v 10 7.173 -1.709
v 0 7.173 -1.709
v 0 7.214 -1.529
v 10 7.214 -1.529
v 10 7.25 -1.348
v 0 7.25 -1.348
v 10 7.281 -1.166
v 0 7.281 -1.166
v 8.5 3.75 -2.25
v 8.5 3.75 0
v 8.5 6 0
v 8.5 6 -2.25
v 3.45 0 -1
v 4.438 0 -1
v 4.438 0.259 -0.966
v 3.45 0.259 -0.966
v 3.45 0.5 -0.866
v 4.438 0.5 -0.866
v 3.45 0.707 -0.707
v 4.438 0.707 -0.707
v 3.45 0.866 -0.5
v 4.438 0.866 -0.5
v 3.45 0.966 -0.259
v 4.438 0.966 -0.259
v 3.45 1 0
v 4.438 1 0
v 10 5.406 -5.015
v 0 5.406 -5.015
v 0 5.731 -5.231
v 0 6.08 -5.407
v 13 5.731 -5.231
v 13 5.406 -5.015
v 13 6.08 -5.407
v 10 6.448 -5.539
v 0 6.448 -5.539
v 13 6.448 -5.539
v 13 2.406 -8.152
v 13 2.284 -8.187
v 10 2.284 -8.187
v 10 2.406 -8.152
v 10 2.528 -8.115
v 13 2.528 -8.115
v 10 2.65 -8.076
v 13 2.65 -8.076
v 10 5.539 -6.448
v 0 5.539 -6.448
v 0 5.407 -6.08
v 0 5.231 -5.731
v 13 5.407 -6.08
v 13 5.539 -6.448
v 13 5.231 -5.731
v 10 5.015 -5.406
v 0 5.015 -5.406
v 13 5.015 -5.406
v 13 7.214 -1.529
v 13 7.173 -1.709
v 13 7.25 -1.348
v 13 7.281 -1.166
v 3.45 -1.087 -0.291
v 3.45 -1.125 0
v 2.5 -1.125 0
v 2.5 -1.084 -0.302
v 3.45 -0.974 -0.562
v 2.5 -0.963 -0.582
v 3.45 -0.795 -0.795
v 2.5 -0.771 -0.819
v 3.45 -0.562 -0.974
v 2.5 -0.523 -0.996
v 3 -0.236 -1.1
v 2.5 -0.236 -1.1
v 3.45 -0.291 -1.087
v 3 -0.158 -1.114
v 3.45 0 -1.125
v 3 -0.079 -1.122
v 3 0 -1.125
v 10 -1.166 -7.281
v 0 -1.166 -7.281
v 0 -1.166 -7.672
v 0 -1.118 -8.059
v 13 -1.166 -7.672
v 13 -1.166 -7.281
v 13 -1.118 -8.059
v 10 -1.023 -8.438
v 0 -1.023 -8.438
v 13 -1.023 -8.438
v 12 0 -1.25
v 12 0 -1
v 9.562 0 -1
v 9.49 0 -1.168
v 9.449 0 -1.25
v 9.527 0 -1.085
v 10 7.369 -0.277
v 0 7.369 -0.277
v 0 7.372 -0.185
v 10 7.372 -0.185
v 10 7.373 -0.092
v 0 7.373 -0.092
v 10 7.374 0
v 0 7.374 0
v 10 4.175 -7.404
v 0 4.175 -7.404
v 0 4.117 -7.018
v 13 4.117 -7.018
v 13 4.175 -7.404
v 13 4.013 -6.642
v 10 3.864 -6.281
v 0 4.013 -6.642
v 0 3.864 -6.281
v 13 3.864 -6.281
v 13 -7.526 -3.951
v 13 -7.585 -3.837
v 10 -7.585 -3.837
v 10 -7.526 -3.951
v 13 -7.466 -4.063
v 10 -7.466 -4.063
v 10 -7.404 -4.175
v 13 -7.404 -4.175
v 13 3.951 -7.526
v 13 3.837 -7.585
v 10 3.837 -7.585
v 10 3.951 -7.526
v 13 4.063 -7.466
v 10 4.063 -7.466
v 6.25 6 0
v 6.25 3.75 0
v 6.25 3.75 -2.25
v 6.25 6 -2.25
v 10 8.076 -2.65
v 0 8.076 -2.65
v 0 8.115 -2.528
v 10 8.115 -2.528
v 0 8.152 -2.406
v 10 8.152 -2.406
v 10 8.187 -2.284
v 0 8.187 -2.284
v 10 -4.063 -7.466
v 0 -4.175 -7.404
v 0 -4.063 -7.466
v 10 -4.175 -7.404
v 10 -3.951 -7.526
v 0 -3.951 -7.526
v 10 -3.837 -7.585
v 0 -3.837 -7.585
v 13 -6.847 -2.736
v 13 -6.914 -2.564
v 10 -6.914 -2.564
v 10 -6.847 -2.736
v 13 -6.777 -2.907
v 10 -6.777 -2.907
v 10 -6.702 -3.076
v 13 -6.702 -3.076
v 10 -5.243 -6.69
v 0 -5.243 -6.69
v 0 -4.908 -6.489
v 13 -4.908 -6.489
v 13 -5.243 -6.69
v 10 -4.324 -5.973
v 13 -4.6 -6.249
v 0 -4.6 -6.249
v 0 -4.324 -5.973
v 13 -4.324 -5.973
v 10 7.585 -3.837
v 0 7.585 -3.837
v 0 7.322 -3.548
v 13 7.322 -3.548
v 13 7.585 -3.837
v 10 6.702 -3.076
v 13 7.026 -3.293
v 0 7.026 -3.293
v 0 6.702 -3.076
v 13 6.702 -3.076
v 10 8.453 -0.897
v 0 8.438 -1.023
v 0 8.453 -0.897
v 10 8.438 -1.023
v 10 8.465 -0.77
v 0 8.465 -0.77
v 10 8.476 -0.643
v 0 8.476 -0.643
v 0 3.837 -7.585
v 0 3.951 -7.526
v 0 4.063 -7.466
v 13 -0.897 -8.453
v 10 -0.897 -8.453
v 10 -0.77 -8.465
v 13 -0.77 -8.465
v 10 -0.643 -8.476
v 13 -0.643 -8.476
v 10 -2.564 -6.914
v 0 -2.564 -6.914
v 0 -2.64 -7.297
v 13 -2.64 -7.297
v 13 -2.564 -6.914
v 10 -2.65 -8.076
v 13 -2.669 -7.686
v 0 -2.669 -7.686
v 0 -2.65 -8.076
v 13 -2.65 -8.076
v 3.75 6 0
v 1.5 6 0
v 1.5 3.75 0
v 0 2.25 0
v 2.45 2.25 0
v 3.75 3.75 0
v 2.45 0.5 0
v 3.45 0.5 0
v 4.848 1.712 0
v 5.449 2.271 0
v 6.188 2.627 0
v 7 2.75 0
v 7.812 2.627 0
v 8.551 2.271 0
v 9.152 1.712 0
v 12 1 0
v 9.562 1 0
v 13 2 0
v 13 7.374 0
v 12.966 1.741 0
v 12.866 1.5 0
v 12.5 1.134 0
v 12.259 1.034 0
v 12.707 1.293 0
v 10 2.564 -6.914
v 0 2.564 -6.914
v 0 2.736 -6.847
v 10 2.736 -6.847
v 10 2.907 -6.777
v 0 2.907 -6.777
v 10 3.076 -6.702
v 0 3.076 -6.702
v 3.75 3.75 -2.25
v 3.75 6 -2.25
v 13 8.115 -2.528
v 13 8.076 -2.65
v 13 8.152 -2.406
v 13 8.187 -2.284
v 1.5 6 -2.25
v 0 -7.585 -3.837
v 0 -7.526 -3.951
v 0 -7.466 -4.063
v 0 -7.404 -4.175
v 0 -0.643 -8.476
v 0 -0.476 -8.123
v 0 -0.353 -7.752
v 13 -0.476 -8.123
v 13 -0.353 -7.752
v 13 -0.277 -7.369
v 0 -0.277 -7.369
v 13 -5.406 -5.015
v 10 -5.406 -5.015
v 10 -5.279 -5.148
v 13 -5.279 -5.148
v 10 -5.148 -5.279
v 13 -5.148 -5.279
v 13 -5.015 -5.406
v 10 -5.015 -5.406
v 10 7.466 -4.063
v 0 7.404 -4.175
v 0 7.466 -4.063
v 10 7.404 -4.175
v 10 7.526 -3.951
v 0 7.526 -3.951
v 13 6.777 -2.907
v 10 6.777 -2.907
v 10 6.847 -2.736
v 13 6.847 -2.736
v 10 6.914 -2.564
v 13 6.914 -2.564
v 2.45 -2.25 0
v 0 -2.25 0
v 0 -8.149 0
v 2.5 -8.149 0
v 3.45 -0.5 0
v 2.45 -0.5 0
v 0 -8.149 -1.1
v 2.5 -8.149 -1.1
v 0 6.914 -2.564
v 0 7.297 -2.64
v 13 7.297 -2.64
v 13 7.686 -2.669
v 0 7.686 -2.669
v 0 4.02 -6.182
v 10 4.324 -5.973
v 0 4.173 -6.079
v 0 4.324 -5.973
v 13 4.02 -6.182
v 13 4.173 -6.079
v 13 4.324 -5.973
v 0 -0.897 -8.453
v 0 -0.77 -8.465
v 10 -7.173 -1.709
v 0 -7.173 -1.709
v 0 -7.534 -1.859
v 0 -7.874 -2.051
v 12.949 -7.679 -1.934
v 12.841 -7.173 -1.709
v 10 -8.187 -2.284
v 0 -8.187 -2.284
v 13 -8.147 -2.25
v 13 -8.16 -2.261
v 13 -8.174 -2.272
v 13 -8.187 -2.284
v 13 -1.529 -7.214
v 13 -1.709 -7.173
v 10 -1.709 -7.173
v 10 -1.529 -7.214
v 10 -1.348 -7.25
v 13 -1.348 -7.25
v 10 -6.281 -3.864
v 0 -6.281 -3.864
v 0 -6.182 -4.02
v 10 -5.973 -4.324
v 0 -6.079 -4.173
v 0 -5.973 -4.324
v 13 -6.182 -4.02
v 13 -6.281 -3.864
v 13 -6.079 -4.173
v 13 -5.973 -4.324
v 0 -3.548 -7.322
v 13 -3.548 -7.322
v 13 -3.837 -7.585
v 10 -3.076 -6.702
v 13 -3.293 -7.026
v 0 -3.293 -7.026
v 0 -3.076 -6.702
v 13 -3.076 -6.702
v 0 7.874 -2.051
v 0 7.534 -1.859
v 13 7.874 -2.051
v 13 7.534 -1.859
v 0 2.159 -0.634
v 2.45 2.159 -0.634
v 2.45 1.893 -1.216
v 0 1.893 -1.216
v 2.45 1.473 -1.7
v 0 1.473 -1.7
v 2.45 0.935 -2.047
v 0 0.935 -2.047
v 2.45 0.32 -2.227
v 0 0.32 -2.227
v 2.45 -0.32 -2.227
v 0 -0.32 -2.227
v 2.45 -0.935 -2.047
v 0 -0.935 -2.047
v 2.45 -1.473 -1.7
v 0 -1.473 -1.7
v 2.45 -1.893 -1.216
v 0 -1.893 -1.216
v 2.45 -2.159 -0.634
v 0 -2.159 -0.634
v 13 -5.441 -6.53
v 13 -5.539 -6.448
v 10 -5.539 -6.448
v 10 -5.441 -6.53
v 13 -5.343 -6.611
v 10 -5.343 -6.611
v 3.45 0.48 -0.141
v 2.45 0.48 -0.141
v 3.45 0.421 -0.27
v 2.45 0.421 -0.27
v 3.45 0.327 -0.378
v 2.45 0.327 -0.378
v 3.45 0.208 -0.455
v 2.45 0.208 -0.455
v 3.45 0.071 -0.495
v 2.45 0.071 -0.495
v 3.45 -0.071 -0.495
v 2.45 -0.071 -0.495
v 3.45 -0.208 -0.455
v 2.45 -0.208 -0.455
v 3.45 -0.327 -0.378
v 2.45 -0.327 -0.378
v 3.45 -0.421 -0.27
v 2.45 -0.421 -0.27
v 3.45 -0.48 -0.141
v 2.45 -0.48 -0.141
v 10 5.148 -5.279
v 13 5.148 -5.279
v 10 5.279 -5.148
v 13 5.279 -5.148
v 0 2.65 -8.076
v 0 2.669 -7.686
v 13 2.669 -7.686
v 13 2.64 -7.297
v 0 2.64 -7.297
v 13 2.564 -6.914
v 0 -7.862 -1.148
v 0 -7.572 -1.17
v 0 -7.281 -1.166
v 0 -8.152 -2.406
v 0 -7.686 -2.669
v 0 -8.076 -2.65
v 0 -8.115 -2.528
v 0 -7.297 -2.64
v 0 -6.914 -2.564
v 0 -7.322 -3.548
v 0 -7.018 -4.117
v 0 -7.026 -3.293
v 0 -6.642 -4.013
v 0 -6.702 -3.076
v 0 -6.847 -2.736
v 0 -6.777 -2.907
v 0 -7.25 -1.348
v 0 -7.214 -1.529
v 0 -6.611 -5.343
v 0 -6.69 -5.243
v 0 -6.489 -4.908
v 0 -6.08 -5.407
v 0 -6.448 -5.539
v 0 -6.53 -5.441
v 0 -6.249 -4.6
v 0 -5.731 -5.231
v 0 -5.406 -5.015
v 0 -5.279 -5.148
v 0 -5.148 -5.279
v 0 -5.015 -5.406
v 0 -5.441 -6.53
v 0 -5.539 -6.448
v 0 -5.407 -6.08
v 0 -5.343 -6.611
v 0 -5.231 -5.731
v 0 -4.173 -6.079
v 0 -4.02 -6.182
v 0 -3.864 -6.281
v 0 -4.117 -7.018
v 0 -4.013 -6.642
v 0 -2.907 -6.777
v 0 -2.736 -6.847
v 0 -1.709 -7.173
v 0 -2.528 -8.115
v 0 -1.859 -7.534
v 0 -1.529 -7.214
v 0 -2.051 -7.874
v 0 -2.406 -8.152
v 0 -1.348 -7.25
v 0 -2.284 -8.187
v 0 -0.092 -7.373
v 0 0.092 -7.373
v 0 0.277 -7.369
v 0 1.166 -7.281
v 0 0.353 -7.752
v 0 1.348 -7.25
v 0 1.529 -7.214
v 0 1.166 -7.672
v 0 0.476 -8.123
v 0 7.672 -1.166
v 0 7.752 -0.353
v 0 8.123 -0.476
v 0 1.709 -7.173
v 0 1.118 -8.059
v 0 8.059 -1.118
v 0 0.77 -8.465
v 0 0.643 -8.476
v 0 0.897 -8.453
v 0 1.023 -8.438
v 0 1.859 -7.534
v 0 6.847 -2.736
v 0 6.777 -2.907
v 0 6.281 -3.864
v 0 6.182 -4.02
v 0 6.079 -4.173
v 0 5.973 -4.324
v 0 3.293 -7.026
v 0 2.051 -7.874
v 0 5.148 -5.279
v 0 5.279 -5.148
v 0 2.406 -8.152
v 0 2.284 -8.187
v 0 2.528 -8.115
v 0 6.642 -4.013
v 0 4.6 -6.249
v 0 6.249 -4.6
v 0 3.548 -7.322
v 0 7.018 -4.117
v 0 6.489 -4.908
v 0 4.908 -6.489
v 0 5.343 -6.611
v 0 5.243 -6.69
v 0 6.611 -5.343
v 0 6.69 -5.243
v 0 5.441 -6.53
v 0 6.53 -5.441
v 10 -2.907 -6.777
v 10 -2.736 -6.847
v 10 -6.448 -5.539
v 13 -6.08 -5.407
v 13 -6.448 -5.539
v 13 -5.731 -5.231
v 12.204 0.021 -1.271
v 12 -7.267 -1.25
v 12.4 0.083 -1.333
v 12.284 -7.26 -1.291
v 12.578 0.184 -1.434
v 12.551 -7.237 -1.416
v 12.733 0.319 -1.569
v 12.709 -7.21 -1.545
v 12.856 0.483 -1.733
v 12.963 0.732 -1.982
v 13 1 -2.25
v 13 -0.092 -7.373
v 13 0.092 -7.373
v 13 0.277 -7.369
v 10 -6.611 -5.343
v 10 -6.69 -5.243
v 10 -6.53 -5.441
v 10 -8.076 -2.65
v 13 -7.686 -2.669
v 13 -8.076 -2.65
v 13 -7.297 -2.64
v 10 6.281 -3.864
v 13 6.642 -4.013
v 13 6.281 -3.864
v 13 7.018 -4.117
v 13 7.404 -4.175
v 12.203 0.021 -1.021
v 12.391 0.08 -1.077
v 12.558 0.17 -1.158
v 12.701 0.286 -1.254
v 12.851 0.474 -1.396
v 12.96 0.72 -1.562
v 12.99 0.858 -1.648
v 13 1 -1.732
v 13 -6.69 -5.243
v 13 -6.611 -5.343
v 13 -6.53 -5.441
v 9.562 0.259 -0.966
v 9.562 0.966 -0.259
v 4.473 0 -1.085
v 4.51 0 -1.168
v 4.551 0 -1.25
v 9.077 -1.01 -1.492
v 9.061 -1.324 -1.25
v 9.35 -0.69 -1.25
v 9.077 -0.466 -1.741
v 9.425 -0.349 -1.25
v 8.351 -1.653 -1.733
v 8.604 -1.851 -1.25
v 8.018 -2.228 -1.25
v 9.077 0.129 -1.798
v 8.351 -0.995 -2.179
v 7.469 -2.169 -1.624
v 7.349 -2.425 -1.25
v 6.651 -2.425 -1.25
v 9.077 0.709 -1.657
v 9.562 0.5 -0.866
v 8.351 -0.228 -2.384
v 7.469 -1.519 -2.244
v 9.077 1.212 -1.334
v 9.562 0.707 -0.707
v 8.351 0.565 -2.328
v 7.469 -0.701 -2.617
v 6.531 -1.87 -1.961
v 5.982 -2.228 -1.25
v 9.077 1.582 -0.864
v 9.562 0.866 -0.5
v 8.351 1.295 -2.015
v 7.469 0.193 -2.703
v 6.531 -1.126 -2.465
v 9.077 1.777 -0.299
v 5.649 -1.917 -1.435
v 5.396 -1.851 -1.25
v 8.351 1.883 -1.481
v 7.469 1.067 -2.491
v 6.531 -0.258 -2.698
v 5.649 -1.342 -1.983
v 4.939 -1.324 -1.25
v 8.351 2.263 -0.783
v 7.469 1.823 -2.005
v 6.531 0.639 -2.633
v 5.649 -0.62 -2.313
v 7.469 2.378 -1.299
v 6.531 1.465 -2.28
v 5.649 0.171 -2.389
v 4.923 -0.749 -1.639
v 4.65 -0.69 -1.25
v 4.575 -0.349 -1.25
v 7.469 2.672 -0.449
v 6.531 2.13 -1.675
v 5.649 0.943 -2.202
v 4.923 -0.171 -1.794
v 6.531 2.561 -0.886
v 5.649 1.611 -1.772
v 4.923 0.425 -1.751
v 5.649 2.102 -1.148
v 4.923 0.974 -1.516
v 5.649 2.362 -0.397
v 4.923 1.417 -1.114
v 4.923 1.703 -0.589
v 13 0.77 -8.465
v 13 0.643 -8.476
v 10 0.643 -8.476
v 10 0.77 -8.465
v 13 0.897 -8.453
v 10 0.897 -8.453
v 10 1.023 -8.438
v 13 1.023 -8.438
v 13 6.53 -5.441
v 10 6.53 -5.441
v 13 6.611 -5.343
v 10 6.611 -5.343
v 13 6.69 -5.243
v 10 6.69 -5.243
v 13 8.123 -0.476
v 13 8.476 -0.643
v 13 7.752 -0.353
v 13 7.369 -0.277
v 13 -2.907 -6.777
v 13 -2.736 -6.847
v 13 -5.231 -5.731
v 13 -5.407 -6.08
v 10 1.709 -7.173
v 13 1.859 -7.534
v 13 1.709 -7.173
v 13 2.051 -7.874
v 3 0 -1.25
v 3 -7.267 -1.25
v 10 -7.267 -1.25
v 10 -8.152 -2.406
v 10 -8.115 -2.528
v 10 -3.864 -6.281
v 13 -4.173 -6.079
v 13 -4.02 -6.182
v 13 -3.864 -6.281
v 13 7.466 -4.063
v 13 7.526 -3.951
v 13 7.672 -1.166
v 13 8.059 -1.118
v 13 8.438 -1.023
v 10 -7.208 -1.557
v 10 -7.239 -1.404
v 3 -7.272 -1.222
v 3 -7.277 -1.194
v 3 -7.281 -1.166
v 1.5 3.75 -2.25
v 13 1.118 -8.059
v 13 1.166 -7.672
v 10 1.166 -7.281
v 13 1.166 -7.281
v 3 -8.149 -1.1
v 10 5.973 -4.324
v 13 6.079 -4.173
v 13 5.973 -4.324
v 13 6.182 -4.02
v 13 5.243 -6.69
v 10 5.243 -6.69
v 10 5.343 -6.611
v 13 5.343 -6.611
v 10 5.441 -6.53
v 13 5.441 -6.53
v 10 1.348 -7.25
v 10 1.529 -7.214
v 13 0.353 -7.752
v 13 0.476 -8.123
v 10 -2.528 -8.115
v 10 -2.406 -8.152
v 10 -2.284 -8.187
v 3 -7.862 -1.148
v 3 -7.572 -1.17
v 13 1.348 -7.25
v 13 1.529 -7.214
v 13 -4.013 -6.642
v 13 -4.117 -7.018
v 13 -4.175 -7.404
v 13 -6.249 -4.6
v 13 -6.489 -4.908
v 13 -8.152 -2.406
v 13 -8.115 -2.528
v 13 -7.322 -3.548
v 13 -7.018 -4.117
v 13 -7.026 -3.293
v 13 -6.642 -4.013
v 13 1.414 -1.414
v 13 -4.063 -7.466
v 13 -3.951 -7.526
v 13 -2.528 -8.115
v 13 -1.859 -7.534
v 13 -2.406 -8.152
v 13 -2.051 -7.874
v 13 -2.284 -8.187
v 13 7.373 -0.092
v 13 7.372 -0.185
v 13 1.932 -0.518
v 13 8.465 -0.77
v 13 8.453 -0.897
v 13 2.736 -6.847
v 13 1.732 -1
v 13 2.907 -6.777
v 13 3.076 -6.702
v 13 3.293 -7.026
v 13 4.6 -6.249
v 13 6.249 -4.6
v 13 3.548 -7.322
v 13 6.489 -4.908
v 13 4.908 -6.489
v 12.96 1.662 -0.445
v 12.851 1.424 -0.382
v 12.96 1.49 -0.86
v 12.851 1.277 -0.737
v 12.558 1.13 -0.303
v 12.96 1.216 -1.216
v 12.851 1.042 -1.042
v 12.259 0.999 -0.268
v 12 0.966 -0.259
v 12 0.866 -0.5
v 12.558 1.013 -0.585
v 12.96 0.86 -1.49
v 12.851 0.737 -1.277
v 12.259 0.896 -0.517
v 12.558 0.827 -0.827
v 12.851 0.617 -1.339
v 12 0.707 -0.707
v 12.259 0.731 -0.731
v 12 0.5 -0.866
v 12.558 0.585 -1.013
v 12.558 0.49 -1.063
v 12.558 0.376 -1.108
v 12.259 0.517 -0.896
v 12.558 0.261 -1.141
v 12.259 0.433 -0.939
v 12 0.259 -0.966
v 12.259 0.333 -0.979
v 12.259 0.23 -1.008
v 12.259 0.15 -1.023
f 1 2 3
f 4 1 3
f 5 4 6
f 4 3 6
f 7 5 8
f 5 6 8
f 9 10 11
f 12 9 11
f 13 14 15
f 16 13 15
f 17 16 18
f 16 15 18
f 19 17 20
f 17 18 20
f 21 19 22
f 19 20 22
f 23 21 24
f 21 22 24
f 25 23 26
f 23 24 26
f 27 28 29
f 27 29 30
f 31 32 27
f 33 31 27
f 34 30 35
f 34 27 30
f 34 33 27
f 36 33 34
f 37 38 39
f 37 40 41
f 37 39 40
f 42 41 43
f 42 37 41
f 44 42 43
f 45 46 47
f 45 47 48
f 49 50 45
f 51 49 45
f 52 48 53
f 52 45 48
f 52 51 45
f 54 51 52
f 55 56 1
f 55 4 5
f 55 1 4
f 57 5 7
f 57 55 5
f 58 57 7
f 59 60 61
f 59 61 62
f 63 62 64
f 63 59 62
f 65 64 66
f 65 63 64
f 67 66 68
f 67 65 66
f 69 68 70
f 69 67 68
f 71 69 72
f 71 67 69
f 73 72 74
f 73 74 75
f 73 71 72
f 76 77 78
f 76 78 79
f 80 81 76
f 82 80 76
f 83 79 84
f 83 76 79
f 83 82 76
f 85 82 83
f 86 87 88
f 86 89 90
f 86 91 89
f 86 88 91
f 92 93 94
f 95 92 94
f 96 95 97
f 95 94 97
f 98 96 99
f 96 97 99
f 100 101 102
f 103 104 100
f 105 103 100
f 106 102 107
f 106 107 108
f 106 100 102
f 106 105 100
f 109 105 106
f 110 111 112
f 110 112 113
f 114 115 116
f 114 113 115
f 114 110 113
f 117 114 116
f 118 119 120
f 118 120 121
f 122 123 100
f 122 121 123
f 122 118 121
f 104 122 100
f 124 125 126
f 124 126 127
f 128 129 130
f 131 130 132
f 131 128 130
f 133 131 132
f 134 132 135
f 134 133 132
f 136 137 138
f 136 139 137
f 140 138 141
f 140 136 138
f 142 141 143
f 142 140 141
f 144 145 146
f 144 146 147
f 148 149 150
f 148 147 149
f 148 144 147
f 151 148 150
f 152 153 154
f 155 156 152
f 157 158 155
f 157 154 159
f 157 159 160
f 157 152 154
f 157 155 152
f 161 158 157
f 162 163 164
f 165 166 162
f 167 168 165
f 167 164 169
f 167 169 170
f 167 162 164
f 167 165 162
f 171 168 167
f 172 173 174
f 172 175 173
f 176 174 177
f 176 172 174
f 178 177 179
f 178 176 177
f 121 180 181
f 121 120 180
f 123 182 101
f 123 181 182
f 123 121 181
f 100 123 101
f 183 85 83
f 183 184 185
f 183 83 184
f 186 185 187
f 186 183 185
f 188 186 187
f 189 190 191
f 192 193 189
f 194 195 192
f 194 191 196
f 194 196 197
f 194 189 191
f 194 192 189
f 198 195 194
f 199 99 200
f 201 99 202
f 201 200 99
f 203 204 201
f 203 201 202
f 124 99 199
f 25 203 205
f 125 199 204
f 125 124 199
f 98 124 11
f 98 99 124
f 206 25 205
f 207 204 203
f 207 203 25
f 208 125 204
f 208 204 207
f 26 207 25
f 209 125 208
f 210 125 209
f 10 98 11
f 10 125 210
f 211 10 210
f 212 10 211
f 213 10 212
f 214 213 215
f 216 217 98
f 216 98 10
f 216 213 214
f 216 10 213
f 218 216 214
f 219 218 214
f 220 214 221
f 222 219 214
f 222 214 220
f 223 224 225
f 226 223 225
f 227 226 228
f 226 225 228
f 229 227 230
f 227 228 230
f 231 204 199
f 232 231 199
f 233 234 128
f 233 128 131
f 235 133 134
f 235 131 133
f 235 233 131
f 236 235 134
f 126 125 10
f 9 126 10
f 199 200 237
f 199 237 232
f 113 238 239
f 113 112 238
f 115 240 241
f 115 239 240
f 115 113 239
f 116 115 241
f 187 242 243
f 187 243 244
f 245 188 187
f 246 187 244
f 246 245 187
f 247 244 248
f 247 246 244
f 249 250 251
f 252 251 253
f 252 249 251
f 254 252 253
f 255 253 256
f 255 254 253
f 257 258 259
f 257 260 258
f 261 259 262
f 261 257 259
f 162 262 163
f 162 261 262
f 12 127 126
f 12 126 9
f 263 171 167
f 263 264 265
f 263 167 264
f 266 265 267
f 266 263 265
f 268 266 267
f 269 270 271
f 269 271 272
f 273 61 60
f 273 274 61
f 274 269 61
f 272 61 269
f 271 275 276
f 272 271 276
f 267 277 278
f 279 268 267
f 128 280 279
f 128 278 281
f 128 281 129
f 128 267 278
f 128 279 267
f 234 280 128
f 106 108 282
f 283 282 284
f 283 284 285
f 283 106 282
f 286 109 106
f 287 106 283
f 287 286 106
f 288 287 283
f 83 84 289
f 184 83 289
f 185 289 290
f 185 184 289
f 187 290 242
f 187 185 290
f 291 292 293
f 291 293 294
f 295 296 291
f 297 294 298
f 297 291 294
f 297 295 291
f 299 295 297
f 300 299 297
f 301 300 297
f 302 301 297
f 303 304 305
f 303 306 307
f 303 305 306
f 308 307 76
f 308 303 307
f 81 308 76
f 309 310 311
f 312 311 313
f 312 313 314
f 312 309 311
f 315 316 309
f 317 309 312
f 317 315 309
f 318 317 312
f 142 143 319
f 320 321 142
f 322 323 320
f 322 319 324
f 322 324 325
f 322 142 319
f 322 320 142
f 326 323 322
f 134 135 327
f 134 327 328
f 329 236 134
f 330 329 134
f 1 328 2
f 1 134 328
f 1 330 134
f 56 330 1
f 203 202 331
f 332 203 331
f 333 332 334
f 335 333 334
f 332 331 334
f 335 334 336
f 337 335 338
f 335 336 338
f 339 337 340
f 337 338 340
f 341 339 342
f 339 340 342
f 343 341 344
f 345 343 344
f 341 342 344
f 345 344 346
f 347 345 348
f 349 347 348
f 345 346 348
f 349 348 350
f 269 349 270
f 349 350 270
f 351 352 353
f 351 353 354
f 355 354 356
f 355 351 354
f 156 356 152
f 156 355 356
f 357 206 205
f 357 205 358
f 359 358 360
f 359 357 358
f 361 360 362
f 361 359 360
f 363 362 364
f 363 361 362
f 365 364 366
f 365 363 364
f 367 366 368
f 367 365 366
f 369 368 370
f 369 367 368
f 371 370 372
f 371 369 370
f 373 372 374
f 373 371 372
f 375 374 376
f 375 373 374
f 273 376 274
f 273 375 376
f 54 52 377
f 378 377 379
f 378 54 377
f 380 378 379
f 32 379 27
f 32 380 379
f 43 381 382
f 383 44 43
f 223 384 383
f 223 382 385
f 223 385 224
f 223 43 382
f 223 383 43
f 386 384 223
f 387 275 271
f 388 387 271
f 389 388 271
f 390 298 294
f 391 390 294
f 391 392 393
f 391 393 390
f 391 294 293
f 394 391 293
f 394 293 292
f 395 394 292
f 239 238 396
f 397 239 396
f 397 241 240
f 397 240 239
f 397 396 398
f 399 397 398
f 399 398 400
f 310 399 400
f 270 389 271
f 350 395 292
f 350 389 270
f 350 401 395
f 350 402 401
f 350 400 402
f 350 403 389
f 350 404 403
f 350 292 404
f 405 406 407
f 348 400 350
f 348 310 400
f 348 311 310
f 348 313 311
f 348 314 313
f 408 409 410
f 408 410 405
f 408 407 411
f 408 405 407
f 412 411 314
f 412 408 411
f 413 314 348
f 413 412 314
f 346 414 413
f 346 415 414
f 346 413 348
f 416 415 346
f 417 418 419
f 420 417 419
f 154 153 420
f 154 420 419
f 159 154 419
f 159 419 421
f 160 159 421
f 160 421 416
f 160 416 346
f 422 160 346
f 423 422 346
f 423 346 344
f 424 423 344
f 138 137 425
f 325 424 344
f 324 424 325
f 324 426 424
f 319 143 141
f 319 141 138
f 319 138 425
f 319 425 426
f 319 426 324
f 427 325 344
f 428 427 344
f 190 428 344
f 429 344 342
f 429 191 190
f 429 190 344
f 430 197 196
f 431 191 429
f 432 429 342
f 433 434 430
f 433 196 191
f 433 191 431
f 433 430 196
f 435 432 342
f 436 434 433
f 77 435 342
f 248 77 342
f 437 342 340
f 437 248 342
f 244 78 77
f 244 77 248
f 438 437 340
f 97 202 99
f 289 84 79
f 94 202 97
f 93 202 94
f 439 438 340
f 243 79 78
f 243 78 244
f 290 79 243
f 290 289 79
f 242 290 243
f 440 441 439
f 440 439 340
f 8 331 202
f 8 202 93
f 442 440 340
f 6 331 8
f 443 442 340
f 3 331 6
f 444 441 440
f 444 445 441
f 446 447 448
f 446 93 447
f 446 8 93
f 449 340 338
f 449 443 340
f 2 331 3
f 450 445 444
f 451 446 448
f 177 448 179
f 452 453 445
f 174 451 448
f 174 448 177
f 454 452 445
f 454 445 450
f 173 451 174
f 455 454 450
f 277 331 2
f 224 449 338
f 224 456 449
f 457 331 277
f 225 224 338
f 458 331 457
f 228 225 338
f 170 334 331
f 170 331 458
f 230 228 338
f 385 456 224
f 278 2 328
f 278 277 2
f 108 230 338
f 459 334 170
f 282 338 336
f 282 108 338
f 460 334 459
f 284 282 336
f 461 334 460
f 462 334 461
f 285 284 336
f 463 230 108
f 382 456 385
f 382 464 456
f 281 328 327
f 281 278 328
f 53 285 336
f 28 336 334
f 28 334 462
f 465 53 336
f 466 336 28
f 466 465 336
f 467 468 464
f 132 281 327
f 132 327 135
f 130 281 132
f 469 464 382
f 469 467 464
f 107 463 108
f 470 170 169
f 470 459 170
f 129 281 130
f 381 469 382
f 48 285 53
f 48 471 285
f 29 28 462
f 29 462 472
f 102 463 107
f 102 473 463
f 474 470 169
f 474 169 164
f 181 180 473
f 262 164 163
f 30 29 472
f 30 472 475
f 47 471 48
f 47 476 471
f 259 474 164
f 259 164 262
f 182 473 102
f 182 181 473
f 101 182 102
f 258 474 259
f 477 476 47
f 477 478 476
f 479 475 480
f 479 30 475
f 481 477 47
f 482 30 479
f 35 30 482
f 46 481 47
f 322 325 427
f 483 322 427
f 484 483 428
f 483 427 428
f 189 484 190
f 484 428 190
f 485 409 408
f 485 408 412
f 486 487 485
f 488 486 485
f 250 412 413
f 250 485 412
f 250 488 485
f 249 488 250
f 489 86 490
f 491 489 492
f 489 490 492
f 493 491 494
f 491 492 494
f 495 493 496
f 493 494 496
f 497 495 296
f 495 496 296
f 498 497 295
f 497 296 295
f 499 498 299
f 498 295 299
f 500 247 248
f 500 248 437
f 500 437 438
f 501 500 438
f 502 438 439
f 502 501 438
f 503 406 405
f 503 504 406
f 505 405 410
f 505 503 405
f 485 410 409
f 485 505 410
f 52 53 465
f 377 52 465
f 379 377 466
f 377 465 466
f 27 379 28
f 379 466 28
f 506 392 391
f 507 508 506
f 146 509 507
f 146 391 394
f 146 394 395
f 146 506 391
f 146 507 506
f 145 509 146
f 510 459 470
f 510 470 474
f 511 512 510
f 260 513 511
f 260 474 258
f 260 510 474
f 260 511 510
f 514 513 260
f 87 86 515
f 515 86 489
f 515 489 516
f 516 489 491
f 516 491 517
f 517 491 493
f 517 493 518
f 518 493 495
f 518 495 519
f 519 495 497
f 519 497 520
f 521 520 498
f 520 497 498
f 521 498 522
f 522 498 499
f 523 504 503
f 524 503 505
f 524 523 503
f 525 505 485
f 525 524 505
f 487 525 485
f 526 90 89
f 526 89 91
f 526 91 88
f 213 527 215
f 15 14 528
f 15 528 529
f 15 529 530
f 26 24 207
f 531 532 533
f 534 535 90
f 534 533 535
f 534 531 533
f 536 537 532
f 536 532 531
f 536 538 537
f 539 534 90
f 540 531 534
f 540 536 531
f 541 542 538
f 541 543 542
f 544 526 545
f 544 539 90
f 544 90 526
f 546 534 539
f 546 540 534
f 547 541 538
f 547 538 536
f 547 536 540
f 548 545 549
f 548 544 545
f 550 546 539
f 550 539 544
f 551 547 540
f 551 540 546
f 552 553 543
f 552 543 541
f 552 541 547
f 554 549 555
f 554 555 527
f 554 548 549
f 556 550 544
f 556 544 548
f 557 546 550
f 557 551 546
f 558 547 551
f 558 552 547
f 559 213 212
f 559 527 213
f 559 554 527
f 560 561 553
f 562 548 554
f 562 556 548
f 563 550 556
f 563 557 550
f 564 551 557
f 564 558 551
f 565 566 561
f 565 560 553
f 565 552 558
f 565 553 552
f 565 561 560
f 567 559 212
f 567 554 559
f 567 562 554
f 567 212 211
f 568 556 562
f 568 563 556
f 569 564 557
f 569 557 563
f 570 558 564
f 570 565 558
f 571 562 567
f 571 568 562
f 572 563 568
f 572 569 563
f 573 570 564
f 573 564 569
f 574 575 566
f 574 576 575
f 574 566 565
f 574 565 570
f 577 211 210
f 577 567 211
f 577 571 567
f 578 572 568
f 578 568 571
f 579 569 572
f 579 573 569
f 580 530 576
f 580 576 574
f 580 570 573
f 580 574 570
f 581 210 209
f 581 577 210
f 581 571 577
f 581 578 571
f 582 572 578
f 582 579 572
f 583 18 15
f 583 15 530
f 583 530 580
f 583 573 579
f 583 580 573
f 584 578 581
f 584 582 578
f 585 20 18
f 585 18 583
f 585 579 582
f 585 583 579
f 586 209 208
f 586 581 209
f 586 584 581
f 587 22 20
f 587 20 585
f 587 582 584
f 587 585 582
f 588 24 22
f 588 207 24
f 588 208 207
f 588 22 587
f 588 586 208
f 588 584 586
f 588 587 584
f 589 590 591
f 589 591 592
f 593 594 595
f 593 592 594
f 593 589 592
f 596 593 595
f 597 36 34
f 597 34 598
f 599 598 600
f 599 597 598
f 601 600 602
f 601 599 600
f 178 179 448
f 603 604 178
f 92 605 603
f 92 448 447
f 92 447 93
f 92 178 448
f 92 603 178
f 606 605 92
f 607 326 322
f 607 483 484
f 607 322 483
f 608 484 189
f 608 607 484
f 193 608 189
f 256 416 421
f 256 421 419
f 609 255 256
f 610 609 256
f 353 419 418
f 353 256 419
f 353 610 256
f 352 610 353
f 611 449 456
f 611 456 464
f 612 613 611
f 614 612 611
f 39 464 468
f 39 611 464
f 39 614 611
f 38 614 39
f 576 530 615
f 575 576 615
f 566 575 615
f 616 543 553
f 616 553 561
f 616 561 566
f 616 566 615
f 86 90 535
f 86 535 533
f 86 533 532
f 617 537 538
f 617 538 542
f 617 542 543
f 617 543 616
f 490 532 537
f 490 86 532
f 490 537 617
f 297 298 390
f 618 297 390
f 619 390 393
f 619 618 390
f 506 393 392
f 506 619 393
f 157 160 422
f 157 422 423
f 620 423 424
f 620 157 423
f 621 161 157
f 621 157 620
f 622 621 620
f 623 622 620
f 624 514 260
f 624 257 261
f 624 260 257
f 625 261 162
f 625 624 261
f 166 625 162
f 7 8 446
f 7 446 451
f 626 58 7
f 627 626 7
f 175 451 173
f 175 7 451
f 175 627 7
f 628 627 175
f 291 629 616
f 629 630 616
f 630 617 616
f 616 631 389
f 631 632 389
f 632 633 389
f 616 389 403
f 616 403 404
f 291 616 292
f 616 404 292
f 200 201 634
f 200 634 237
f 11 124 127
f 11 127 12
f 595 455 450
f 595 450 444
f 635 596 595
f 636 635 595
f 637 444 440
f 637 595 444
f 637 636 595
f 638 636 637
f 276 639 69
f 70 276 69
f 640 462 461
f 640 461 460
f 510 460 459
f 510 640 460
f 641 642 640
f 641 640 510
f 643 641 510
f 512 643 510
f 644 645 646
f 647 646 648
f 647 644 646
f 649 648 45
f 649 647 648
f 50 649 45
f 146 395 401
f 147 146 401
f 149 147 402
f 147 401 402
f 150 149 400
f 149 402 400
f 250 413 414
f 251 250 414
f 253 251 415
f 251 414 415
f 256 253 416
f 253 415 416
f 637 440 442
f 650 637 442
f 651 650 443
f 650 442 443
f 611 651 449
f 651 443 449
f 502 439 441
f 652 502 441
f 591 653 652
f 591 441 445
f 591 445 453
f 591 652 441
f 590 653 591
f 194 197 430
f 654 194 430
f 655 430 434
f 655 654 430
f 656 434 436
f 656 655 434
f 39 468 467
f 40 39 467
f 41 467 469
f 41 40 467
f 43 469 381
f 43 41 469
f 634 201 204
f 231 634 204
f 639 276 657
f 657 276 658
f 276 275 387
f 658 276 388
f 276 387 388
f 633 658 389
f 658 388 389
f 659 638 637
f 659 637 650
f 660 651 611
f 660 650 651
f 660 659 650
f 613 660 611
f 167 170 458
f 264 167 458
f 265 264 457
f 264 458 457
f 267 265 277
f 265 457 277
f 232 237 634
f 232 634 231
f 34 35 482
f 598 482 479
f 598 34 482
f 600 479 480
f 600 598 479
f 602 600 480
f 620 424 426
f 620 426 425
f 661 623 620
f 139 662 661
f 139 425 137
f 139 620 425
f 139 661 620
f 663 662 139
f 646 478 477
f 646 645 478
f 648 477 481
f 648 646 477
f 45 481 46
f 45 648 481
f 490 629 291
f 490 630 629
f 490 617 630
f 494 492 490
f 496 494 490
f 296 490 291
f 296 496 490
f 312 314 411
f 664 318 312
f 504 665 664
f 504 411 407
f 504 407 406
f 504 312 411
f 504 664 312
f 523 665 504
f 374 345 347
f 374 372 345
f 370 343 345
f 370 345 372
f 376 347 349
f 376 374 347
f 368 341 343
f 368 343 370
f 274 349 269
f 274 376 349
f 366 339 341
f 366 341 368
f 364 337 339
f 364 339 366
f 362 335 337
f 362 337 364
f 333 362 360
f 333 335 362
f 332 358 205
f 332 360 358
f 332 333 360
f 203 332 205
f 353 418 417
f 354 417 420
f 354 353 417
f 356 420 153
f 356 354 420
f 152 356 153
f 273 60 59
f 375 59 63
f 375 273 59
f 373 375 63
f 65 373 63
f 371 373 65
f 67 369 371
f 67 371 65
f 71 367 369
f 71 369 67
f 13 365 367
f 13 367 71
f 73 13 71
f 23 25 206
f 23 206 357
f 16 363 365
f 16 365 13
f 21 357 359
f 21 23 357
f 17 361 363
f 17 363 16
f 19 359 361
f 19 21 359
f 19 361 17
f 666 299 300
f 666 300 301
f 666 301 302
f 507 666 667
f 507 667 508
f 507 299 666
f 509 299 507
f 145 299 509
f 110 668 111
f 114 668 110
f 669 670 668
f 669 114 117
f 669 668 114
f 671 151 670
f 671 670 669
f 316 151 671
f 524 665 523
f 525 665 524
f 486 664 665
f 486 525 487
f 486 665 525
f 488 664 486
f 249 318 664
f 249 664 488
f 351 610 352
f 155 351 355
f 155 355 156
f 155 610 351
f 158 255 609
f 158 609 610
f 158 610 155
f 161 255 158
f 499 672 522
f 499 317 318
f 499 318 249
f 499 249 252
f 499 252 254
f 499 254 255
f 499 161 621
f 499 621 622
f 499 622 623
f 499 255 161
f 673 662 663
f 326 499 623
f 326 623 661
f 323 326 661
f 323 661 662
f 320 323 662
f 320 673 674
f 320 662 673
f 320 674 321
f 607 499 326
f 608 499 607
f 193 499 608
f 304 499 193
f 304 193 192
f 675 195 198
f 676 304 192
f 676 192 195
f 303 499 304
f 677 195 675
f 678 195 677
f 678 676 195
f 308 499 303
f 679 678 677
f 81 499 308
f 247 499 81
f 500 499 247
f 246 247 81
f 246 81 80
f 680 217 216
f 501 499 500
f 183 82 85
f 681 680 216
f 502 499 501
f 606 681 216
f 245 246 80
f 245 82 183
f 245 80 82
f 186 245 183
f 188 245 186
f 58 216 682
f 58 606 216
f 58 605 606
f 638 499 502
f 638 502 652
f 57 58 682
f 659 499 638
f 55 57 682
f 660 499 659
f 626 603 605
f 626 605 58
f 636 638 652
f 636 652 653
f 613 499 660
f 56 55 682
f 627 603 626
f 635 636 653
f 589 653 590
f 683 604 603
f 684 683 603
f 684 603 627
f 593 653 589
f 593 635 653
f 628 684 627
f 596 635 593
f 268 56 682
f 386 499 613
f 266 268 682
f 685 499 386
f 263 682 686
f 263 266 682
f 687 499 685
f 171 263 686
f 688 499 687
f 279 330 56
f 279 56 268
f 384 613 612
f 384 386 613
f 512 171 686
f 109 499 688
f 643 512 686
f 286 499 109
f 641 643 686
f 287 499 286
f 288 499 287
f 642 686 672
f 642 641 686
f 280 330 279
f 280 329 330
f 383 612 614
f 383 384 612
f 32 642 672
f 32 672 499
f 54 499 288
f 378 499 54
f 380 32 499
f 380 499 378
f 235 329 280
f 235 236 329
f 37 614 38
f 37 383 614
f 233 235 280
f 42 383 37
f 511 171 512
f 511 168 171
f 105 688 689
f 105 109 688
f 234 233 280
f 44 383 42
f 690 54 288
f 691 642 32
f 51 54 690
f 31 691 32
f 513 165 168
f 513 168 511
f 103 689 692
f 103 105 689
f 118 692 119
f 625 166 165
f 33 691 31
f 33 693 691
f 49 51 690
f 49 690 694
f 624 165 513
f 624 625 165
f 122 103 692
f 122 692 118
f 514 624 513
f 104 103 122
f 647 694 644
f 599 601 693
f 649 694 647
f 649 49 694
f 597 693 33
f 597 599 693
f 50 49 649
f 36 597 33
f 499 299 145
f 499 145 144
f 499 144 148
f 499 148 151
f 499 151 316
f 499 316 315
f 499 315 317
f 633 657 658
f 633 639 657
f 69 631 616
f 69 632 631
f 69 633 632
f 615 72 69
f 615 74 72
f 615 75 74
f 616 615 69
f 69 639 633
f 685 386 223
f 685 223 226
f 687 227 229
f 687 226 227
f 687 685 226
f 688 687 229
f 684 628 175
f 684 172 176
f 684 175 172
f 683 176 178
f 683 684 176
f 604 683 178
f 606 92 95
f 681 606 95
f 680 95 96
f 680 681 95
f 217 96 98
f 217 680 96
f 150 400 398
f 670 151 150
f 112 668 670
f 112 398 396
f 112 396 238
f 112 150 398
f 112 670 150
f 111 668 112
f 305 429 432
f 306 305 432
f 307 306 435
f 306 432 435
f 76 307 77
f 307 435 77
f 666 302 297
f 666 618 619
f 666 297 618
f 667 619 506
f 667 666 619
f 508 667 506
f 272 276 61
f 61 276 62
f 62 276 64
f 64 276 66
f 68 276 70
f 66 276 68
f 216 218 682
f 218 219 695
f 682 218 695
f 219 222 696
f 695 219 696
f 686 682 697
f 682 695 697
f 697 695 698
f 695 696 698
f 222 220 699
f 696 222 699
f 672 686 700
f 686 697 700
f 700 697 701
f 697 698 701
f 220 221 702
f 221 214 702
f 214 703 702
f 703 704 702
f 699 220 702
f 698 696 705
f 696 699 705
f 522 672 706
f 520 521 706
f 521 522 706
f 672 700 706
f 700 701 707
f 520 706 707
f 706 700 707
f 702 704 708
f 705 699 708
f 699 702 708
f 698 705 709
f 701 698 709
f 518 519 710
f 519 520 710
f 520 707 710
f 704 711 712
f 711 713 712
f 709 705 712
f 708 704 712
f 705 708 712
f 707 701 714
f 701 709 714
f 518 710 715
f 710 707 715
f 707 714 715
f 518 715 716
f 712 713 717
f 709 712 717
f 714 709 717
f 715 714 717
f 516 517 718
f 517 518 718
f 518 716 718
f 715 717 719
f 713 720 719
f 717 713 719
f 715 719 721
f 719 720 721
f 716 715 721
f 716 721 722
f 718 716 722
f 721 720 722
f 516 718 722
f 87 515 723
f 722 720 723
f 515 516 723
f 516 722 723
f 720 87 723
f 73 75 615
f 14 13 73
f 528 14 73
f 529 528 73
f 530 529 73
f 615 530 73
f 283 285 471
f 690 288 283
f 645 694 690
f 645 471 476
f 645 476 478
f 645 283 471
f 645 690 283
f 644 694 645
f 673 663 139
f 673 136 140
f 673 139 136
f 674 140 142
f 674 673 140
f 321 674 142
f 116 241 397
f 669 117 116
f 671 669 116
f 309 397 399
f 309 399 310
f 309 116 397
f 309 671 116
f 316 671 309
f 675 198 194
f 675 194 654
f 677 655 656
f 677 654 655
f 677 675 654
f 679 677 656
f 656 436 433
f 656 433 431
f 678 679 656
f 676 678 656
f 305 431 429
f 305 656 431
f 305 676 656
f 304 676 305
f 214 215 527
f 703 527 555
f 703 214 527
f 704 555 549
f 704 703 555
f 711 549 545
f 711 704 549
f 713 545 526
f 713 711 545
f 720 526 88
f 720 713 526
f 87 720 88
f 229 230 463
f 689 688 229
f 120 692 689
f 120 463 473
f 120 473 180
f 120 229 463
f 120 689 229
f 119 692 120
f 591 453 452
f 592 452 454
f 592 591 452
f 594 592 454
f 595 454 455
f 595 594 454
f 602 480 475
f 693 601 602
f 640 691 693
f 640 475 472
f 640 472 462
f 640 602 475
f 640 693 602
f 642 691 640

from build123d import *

# Parameters (mm, degrees)
BASPROSKE_W         = 10
BASPROSKE_H         = 8.5
TOOTHCUT_DEPTH      = 16.636495771
TEETHCUTS_COUNT     = 32
TEETHCUTS_ANGLE     = 348.75
BORSKE_R            = 1
BORE_DEPTH          = 50.0000508
SKETCH1_W           = 2.2
SKETCH1_H           = 12
CUT_EXTRUDE1_DEPTH  = 16.610070769
SKETCH4_R           = 1.125
SKETCH4_R_2         = 0.5
BOSS_EXTRUDE1_DEPTH = 0.5
BOSS_EXTRUDE2_REACH = 18.234
SKETCH5_W           = 2.5
SKETCH5_H           = 8.148803967
SKETCH6_R           = 2.25
CUT_EXTRUDE4_DEPTH  = 2.45
SKETCH7_R           = 0.5
CUT_EXTRUDE5_DEPTH  = 2.4
SKETCH8_W           = 11.062945953
SKETCH8_H           = 17.798852561
CUT_EXTRUDE7_DEPTH  = 10
SKETCH9_W           = 2.25
SKETCH9_H           = 2.25
CUT_EXTRUDE8_DEPTH  = 2.25
SKETCH10_W          = 1.25
SKETCH10_H          = 9
CUT_EXTRUDE10_DEPTH = 7
BOSS_EXTRUDE3_REACH = 18.961
BOSS_EXTRUDE4_DEPTH = 1.25
BOSS_EXTRUDE5_START = -1
BOSS_EXTRUDE5_DEPTH = 1
FILLET1_R           = 1


with BuildPart() as part:
    # BasProSke → Base-Revolve (revolve)
    with BuildSketch(Plane(origin=(0, 0, 0), x_dir=(1, 0, 0), z_dir=(0, 1, 0)), mode=Mode.PRIVATE) as base_revolve_sk:
        with Locations((5, 4.25)):
            Rectangle(BASPROSKE_W, BASPROSKE_H)
    revolve(base_revolve_sk.sketch.rotate(Axis((-10, 0, 0), (1, 0, 0)), 180), axis=Axis((-10, 0, 0), (1, 0, 0)))

    # TooCutSke → ToothCut (cut, through all)
    with BuildSketch(Plane(origin=(0, 0, 0), x_dir=(0, 0, -1), z_dir=(1, 0, 0))):
        with BuildLine():
            ThreePointArc((0.277002447, 7.3687954), (0, 7.374), (-0.277002447, 7.3687954))
            ThreePointArc((-0.277002447, 7.3687954), (-0.41335061, 7.952280695), (-0.656086882, 8.500117362))
            ThreePointArc((-0.656086882, 8.500117362), (0, 8.5254), (0.656086882, 8.500117362))
            ThreePointArc((0.656086882, 8.500117362), (0.41335061, 7.952280695), (0.277002447, 7.3687954))
        make_face()
    toothcut = extrude(amount=TOOTHCUT_DEPTH, mode=Mode.SUBTRACT)

    # TeethCuts: ToothCut ×32 about axis
    teethcuts_axis = Axis((-10, 0, 0), (1, 0, 0))
    for i in range(1, TEETHCUTS_COUNT):
        add(toothcut.rotate(teethcuts_axis, i * TEETHCUTS_ANGLE / (TEETHCUTS_COUNT - 1)), mode=Mode.SUBTRACT)

    # BorSke → Bore (cut, symmetric)
    with BuildSketch(Plane(origin=(0, 0, 0), x_dir=(0, 0, -1), z_dir=(1, 0, 0))):
        with Locations(Location((0, 0, 0), (0, 0, 180))):
            Circle(BORSKE_R)
    extrude(amount=BORE_DEPTH, both=True, mode=Mode.SUBTRACT)

    # Sketch1 → Cut-Extrude1 (cut, through all)
    with BuildSketch(Plane(origin=(10, 0, 0), x_dir=(0, 0, -1), z_dir=(1, 0, 0))):
        with Locations((0, -6)):
            Rectangle(SKETCH1_W, SKETCH1_H)
    extrude(amount=-CUT_EXTRUDE1_DEPTH, mode=Mode.SUBTRACT)

    # Sketch2 → Cut-Revolve1 (revolve, cut)
    with BuildSketch(Plane.XY):
        with BuildLine():
            Line((4.25, 0), (9.75, 0))
            ThreePointArc((9.75, 0), (7, 2.75), (4.25, 0))
        make_face()
    revolve(axis=Axis((4.25, 0, 0), (1, 0, 0)), mode=Mode.SUBTRACT)

    # Sketch4 → Boss-Extrude1 (add)
    with BuildSketch(Plane.ZY.offset(-3)):
        Circle(SKETCH4_R)
        Circle(SKETCH4_R_2, mode=Mode.SUBTRACT)
    extrude(amount=BOSS_EXTRUDE1_DEPTH)

    # Sketch5 → Boss-Extrude2 (add, up to next)
    with BuildSketch(Plane.XY.offset(-1.1), mode=Mode.PRIVATE) as boss_extrude2_sk1:
        with Locations((1.25, -4.074401984)):
            Rectangle(SKETCH5_W, SKETCH5_H)
    boss_extrude2_tool1 = extrude(boss_extrude2_sk1.sketch, amount=BOSS_EXTRUDE2_REACH, mode=Mode.PRIVATE) - part.part
    add(boss_extrude2_tool1.solids().sort_by_distance((1.25, -4.074402, -1.1))[0])

    # Sketch6 → Cut-Extrude4 (cut)
    with BuildSketch(Plane.ZY):
        Circle(SKETCH6_R)
    extrude(amount=-CUT_EXTRUDE4_DEPTH, mode=Mode.SUBTRACT)

    # Sketch7 → Cut-Extrude5 (cut)
    with BuildSketch(Plane(origin=(2.5, 0, 0), x_dir=(0, 0, -1), z_dir=(1, 0, 0))):
        with Locations(Location((0, 0, 0), (0, 0, 180))):
            Circle(SKETCH7_R)
    extrude(amount=-CUT_EXTRUDE5_DEPTH, mode=Mode.SUBTRACT)

    # Sketch8 → Cut-Extrude7 (cut)
    with BuildSketch(Plane.XY):
        with Locations((5.022304327, 0.010278679)):
            Rectangle(SKETCH8_W, SKETCH8_H)
    extrude(amount=CUT_EXTRUDE7_DEPTH, mode=Mode.SUBTRACT)

    # Sketch9 → Cut-Extrude8 (cut)
    with BuildSketch(Plane.XY):
        with Locations((2.625, 4.875)):
            Rectangle(SKETCH9_W, SKETCH9_H)
        with Locations((7.375, 4.875)):
            Rectangle(SKETCH9_W, SKETCH9_H)
    extrude(amount=-CUT_EXTRUDE8_DEPTH, mode=Mode.SUBTRACT)

    # Sketch10 → Cut-Extrude10 (cut)
    with BuildSketch(Plane(origin=(10, 0, 0), x_dir=(0, 0, -1), z_dir=(1, 0, 0))):
        with Locations((0.625, -4.5)):
            Rectangle(SKETCH10_W, SKETCH10_H)
    extrude(amount=-CUT_EXTRUDE10_DEPTH, mode=Mode.SUBTRACT)

    # Sketch11 → Boss-Extrude3 (add, up to next)
    with BuildSketch(Plane(origin=(12, 0, 0), x_dir=(0, 0, -1), z_dir=(1, 0, 0)), mode=Mode.PRIVATE) as boss_extrude3_sk1:
        with BuildLine():
            Line((0, 1), (0, 7.374))
            ThreePointArc((0, 7.374), (0.138525669, 7.372698735), (0.277002447, 7.3687954))
            ThreePointArc((0.277002447, 7.3687954), (0.408940123, 7.939022225), (0.642530382, 8.475680191))
            ThreePointArc((0.642530382, 8.475680191), (0.833145693, 8.459070177), (1.023338837, 8.438173832))
            ThreePointArc((1.023338837, 8.438173832), (1.14774395, 7.866256399), (1.165900745, 7.281246559))
            ThreePointArc((1.165900745, 7.281246559), (1.438596035, 7.232310658), (1.70926059, 7.173165566))
            ThreePointArc((1.70926059, 7.173165566), (1.949908855, 7.706695879), (2.283707519, 8.187470914))
            ThreePointArc((2.283707519, 8.187470914), (2.467419757, 8.133992854), (2.649881718, 8.076393185))
            ThreePointArc((2.649881718, 8.076393185), (2.660320865, 7.491194752), (2.563999025, 6.913883496))
            ThreePointArc((2.563999025, 6.913883496), (2.82190763, 6.812687673), (3.075832807, 6.701875002))
            ThreePointArc((3.075832807, 6.701875002), (3.415943684, 7.178205532), (3.837123056, 7.584621721))
            ThreePointArc((3.837123056, 7.584621721), (4.006872263, 7.496330747), (4.174591131, 7.404241277))
            ThreePointArc((4.174591131, 7.404241277), (4.070663142, 6.828250691), (3.86356426, 6.280823768))
            ThreePointArc((3.86356426, 6.280823768), (4.096774898, 6.131256921), (4.324202495, 5.97303514))
            ThreePointArc((4.324202495, 5.97303514), (4.750705713, 6.373860772), (5.243080107, 6.690299769))
            ThreePointArc((5.243080107, 6.690299769), (5.392342915, 6.570588854), (5.538873348, 6.447548529))
            ThreePointArc((5.538873348, 6.447548529), (5.324572118, 5.902900785), (5.014654888, 5.406395505))
            ThreePointArc((5.014654888, 5.406395505), (5.214205404, 5.214205404), (5.406395505, 5.014654888))
            ThreePointArc((5.406395505, 5.014654888), (5.902900785, 5.324572118), (6.447548529, 5.538873348))
            ThreePointArc((6.447548529, 5.538873348), (6.570588854, 5.392342915), (6.690299769, 5.243080107))
            ThreePointArc((6.690299769, 5.243080107), (6.373860772, 4.750705713), (5.97303514, 4.324202495))
            ThreePointArc((5.97303514, 4.324202495), (6.131256921, 4.096774898), (6.280823768, 3.86356426))
            ThreePointArc((6.280823768, 3.86356426), (6.828250691, 4.070663142), (7.404241277, 4.174591131))
            ThreePointArc((7.404241277, 4.174591131), (7.496330747, 4.006872263), (7.584621721, 3.837123056))
            ThreePointArc((7.584621721, 3.837123056), (7.178205532, 3.415943684), (6.701875002, 3.075832807))
            ThreePointArc((6.701875002, 3.075832807), (6.812687673, 2.82190763), (6.913883496, 2.563999025))
            ThreePointArc((6.913883496, 2.563999025), (7.491194752, 2.660320865), (8.076393185, 2.649881718))
            ThreePointArc((8.076393185, 2.649881718), (8.133992854, 2.467419757), (8.187470914, 2.283707519))
            ThreePointArc((8.187470914, 2.283707519), (7.706695879, 1.949908855), (7.173165566, 1.70926059))
            ThreePointArc((7.173165566, 1.70926059), (7.232310658, 1.438596035), (7.281246559, 1.165900745))
            ThreePointArc((7.281246559, 1.165900745), (7.866256399, 1.14774395), (8.438173832, 1.023338837))
            ThreePointArc((8.438173832, 1.023338837), (8.459070177, 0.833145693), (8.475680191, 0.642530382))
            ThreePointArc((8.475680191, 0.642530382), (7.939022225, 0.408940123), (7.3687954, 0.277002447))
            ThreePointArc((7.3687954, 0.277002447), (7.374, 0), (7.3687954, -0.277002447))
            ThreePointArc((7.3687954, -0.277002447), (7.939022225, -0.408940123), (8.475680191, -0.642530382))
            ThreePointArc((8.475680191, -0.642530382), (8.459070177, -0.833145693), (8.438173832, -1.023338837))
            ThreePointArc((8.438173832, -1.023338837), (7.866256399, -1.14774395), (7.281246559, -1.165900745))
            ThreePointArc((7.281246559, -1.165900745), (7.232310658, -1.438596035), (7.173165566, -1.70926059))
            ThreePointArc((7.173165566, -1.70926059), (7.706695879, -1.949908855), (8.187470914, -2.283707519))
            ThreePointArc((8.187470914, -2.283707519), (8.133992854, -2.467419757), (8.076393185, -2.649881718))
            ThreePointArc((8.076393185, -2.649881718), (7.491194752, -2.660320865), (6.913883496, -2.563999025))
            ThreePointArc((6.913883496, -2.563999025), (6.812687673, -2.82190763), (6.701875002, -3.075832807))
            ThreePointArc((6.701875002, -3.075832807), (7.178205532, -3.415943684), (7.584621721, -3.837123056))
            ThreePointArc((7.584621721, -3.837123056), (7.496330747, -4.006872263), (7.404241277, -4.174591131))
            ThreePointArc((7.404241277, -4.174591131), (6.828250691, -4.070663142), (6.280823768, -3.86356426))
            ThreePointArc((6.280823768, -3.86356426), (6.131256921, -4.096774898), (5.97303514, -4.324202495))
            ThreePointArc((5.97303514, -4.324202495), (6.373860772, -4.750705713), (6.690299769, -5.243080107))
            ThreePointArc((6.690299769, -5.243080107), (6.570588854, -5.392342915), (6.447548529, -5.538873348))
            ThreePointArc((6.447548529, -5.538873348), (5.902900785, -5.324572118), (5.406395505, -5.014654888))
            ThreePointArc((5.406395505, -5.014654888), (5.214205404, -5.214205404), (5.014654888, -5.406395505))
            ThreePointArc((5.014654888, -5.406395505), (5.324572118, -5.902900785), (5.538873348, -6.447548529))
            ThreePointArc((5.538873348, -6.447548529), (5.392342915, -6.570588854), (5.243080107, -6.690299769))
            ThreePointArc((5.243080107, -6.690299769), (4.750705713, -6.373860772), (4.324202495, -5.97303514))
            ThreePointArc((4.324202495, -5.97303514), (4.096774898, -6.131256921), (3.86356426, -6.280823768))
            ThreePointArc((3.86356426, -6.280823768), (4.070663142, -6.828250691), (4.174591131, -7.404241277))
            ThreePointArc((4.174591131, -7.404241277), (4.006872263, -7.496330747), (3.837123056, -7.584621721))
            ThreePointArc((3.837123056, -7.584621721), (3.415943684, -7.178205532), (3.075832807, -6.701875002))
            ThreePointArc((3.075832807, -6.701875002), (2.82190763, -6.812687673), (2.563999025, -6.913883496))
            ThreePointArc((2.563999025, -6.913883496), (2.660320865, -7.491194752), (2.649881718, -8.076393185))
            ThreePointArc((2.649881718, -8.076393185), (2.467419757, -8.133992854), (2.283707519, -8.187470914))
            ThreePointArc((2.283707519, -8.187470914), (1.949908855, -7.706695879), (1.70926059, -7.173165566))
            ThreePointArc((1.70926059, -7.173165566), (1.480378414, -7.223874013), (1.25, -7.267281197))
            Line((1.25, -7.267281197), (1.25, 0))
            Line((1.25, 0), (1, 0))
            ThreePointArc((1, 0), (0.707106781, 0.707106781), (0, 1))
        make_face()
    boss_extrude3_tool1 = extrude(boss_extrude3_sk1.sketch, amount=-BOSS_EXTRUDE3_REACH, mode=Mode.PRIVATE) - part.part
    add(boss_extrude3_tool1.solids().sort_by_distance((12, 0.4527, -3.714882))[0])

    # Sketch14 → Boss-Extrude4 (add)
    with BuildSketch(Plane(origin=(13, 0, 0), x_dir=(0, 0, -1), z_dir=(1, 0, 0))):
        with BuildLine():
            Line((0, 7.374), (0, 1))
            ThreePointArc((0, 1), (0.707106781, 0.707106781), (1, 0))
            Line((1, 0), (1.25, 0))
            Line((1.25, 0), (1.25, -7.267281197))
            ThreePointArc((1.25, -7.267281197), (1.480378414, -7.223874013), (1.70926059, -7.173165566))
            ThreePointArc((1.70926059, -7.173165566), (1.949908855, -7.706695879), (2.283707519, -8.187470914))
            ThreePointArc((2.283707519, -8.187470914), (2.467419757, -8.133992854), (2.649881718, -8.076393185))
            ThreePointArc((2.649881718, -8.076393185), (2.660320865, -7.491194752), (2.563999025, -6.913883496))
            ThreePointArc((2.563999025, -6.913883496), (2.82190763, -6.812687673), (3.075832807, -6.701875002))
            ThreePointArc((3.075832807, -6.701875002), (3.415943684, -7.178205532), (3.837123056, -7.584621721))
            ThreePointArc((3.837123056, -7.584621721), (4.006872263, -7.496330747), (4.174591131, -7.404241277))
            ThreePointArc((4.174591131, -7.404241277), (4.070663142, -6.828250691), (3.86356426, -6.280823768))
            ThreePointArc((3.86356426, -6.280823768), (4.096774898, -6.131256921), (4.324202495, -5.97303514))
            ThreePointArc((4.324202495, -5.97303514), (4.750705713, -6.373860772), (5.243080107, -6.690299769))
            ThreePointArc((5.243080107, -6.690299769), (5.392342915, -6.570588854), (5.538873348, -6.447548529))
            ThreePointArc((5.538873348, -6.447548529), (5.324572118, -5.902900785), (5.014654888, -5.406395505))
            ThreePointArc((5.014654888, -5.406395505), (5.214205404, -5.214205404), (5.406395505, -5.014654888))
            ThreePointArc((5.406395505, -5.014654888), (5.902900785, -5.324572118), (6.447548529, -5.538873348))
            ThreePointArc((6.447548529, -5.538873348), (6.570588854, -5.392342915), (6.690299769, -5.243080107))
            ThreePointArc((6.690299769, -5.243080107), (6.373860772, -4.750705713), (5.97303514, -4.324202495))
            ThreePointArc((5.97303514, -4.324202495), (6.131256921, -4.096774898), (6.280823768, -3.86356426))
            ThreePointArc((6.280823768, -3.86356426), (6.828250691, -4.070663142), (7.404241277, -4.174591131))
            ThreePointArc((7.404241277, -4.174591131), (7.496330747, -4.006872263), (7.584621721, -3.837123056))
            ThreePointArc((7.584621721, -3.837123056), (7.178205532, -3.415943684), (6.701875002, -3.075832807))
            ThreePointArc((6.701875002, -3.075832807), (6.812687673, -2.82190763), (6.913883496, -2.563999025))
            ThreePointArc((6.913883496, -2.563999025), (7.491194752, -2.660320865), (8.076393185, -2.649881718))
            ThreePointArc((8.076393185, -2.649881718), (8.133992854, -2.467419757), (8.187470914, -2.283707519))
            ThreePointArc((8.187470914, -2.283707519), (7.706695879, -1.949908855), (7.173165566, -1.70926059))
            ThreePointArc((7.173165566, -1.70926059), (7.232310658, -1.438596035), (7.281246559, -1.165900745))
            ThreePointArc((7.281246559, -1.165900745), (7.866256399, -1.14774395), (8.438173832, -1.023338837))
            ThreePointArc((8.438173832, -1.023338837), (8.459070177, -0.833145693), (8.475680191, -0.642530382))
            ThreePointArc((8.475680191, -0.642530382), (7.939022225, -0.408940123), (7.3687954, -0.277002447))
            ThreePointArc((7.3687954, -0.277002447), (7.374, 0), (7.3687954, 0.277002447))
            ThreePointArc((7.3687954, 0.277002447), (7.939022225, 0.408940123), (8.475680191, 0.642530382))
            ThreePointArc((8.475680191, 0.642530382), (8.459070177, 0.833145693), (8.438173832, 1.023338837))
            ThreePointArc((8.438173832, 1.023338837), (7.866256399, 1.14774395), (7.281246559, 1.165900745))
            ThreePointArc((7.281246559, 1.165900745), (7.232310658, 1.438596035), (7.173165566, 1.70926059))
            ThreePointArc((7.173165566, 1.70926059), (7.706695879, 1.949908855), (8.187470914, 2.283707519))
            ThreePointArc((8.187470914, 2.283707519), (8.133992854, 2.467419757), (8.076393185, 2.649881718))
            ThreePointArc((8.076393185, 2.649881718), (7.491194752, 2.660320865), (6.913883496, 2.563999025))
            ThreePointArc((6.913883496, 2.563999025), (6.812687673, 2.82190763), (6.701875002, 3.075832807))
            ThreePointArc((6.701875002, 3.075832807), (7.178205532, 3.415943684), (7.584621721, 3.837123056))
            ThreePointArc((7.584621721, 3.837123056), (7.496330747, 4.006872263), (7.404241277, 4.174591131))
            ThreePointArc((7.404241277, 4.174591131), (6.828250691, 4.070663142), (6.280823768, 3.86356426))
            ThreePointArc((6.280823768, 3.86356426), (6.131256921, 4.096774898), (5.97303514, 4.324202495))
            ThreePointArc((5.97303514, 4.324202495), (6.373860772, 4.750705713), (6.690299769, 5.243080107))
            ThreePointArc((6.690299769, 5.243080107), (6.570588854, 5.392342915), (6.447548529, 5.538873348))
            ThreePointArc((6.447548529, 5.538873348), (5.902900785, 5.324572118), (5.406395505, 5.014654888))
            ThreePointArc((5.406395505, 5.014654888), (5.214205404, 5.214205404), (5.014654888, 5.406395505))
            ThreePointArc((5.014654888, 5.406395505), (5.324572118, 5.902900785), (5.538873348, 6.447548529))
            ThreePointArc((5.538873348, 6.447548529), (5.392342915, 6.570588854), (5.243080107, 6.690299769))
            ThreePointArc((5.243080107, 6.690299769), (4.750705713, 6.373860772), (4.324202495, 5.97303514))
            ThreePointArc((4.324202495, 5.97303514), (4.096774898, 6.131256921), (3.86356426, 6.280823768))
            ThreePointArc((3.86356426, 6.280823768), (4.070663142, 6.828250691), (4.174591131, 7.404241277))
            ThreePointArc((4.174591131, 7.404241277), (4.006872263, 7.496330747), (3.837123056, 7.584621721))
            ThreePointArc((3.837123056, 7.584621721), (3.415943684, 7.178205532), (3.075832807, 6.701875002))
            ThreePointArc((3.075832807, 6.701875002), (2.82190763, 6.812687673), (2.563999025, 6.913883496))
            ThreePointArc((2.563999025, 6.913883496), (2.660320865, 7.491194752), (2.649881718, 8.076393185))
            ThreePointArc((2.649881718, 8.076393185), (2.467419757, 8.133992854), (2.283707519, 8.187470914))
            ThreePointArc((2.283707519, 8.187470914), (1.949908855, 7.706695879), (1.70926059, 7.173165566))
            ThreePointArc((1.70926059, 7.173165566), (1.438596035, 7.232310658), (1.165900745, 7.281246559))
            ThreePointArc((1.165900745, 7.281246559), (1.14774395, 7.866256399), (1.023338837, 8.438173832))
            ThreePointArc((1.023338837, 8.438173832), (0.833145693, 8.459070177), (0.642530382, 8.475680191))
            ThreePointArc((0.642530382, 8.475680191), (0.408940123, 7.939022225), (0.277002447, 7.3687954))
            ThreePointArc((0.277002447, 7.3687954), (0.138525669, 7.372698735), (0, 7.374))
        make_face()
    extrude(amount=-BOSS_EXTRUDE4_DEPTH)

    # Sketch15 → Boss-Extrude5 (add)
    with BuildSketch(Plane.ZY.offset(-2.45).offset(BOSS_EXTRUDE5_START)):
        with BuildLine():
            Line((0, 1.125), (0, 0.5))
            ThreePointArc((0, 0.5), (-0.5, 0), (0, -0.5))
            Line((0, -0.5), (0, -1.125))
            ThreePointArc((0, -1.125), (-1.125, 0), (0, 1.125))
        make_face()
    extrude(amount=BOSS_EXTRUDE5_DEPTH)

    # Fillet1
    fillet1_edges = [part.edges().sort_by_distance(p)[0] for p in [
        (13, 0, -1.125),
        (13, 0.707106781, -0.707106781),
        (13, -3.633640599, -1.25),
    ]]
    fillet(fillet1_edges, radius=FILLET1_R - 0.0001)  # a hair under: the kernel refuses the full size


solid = part.part
